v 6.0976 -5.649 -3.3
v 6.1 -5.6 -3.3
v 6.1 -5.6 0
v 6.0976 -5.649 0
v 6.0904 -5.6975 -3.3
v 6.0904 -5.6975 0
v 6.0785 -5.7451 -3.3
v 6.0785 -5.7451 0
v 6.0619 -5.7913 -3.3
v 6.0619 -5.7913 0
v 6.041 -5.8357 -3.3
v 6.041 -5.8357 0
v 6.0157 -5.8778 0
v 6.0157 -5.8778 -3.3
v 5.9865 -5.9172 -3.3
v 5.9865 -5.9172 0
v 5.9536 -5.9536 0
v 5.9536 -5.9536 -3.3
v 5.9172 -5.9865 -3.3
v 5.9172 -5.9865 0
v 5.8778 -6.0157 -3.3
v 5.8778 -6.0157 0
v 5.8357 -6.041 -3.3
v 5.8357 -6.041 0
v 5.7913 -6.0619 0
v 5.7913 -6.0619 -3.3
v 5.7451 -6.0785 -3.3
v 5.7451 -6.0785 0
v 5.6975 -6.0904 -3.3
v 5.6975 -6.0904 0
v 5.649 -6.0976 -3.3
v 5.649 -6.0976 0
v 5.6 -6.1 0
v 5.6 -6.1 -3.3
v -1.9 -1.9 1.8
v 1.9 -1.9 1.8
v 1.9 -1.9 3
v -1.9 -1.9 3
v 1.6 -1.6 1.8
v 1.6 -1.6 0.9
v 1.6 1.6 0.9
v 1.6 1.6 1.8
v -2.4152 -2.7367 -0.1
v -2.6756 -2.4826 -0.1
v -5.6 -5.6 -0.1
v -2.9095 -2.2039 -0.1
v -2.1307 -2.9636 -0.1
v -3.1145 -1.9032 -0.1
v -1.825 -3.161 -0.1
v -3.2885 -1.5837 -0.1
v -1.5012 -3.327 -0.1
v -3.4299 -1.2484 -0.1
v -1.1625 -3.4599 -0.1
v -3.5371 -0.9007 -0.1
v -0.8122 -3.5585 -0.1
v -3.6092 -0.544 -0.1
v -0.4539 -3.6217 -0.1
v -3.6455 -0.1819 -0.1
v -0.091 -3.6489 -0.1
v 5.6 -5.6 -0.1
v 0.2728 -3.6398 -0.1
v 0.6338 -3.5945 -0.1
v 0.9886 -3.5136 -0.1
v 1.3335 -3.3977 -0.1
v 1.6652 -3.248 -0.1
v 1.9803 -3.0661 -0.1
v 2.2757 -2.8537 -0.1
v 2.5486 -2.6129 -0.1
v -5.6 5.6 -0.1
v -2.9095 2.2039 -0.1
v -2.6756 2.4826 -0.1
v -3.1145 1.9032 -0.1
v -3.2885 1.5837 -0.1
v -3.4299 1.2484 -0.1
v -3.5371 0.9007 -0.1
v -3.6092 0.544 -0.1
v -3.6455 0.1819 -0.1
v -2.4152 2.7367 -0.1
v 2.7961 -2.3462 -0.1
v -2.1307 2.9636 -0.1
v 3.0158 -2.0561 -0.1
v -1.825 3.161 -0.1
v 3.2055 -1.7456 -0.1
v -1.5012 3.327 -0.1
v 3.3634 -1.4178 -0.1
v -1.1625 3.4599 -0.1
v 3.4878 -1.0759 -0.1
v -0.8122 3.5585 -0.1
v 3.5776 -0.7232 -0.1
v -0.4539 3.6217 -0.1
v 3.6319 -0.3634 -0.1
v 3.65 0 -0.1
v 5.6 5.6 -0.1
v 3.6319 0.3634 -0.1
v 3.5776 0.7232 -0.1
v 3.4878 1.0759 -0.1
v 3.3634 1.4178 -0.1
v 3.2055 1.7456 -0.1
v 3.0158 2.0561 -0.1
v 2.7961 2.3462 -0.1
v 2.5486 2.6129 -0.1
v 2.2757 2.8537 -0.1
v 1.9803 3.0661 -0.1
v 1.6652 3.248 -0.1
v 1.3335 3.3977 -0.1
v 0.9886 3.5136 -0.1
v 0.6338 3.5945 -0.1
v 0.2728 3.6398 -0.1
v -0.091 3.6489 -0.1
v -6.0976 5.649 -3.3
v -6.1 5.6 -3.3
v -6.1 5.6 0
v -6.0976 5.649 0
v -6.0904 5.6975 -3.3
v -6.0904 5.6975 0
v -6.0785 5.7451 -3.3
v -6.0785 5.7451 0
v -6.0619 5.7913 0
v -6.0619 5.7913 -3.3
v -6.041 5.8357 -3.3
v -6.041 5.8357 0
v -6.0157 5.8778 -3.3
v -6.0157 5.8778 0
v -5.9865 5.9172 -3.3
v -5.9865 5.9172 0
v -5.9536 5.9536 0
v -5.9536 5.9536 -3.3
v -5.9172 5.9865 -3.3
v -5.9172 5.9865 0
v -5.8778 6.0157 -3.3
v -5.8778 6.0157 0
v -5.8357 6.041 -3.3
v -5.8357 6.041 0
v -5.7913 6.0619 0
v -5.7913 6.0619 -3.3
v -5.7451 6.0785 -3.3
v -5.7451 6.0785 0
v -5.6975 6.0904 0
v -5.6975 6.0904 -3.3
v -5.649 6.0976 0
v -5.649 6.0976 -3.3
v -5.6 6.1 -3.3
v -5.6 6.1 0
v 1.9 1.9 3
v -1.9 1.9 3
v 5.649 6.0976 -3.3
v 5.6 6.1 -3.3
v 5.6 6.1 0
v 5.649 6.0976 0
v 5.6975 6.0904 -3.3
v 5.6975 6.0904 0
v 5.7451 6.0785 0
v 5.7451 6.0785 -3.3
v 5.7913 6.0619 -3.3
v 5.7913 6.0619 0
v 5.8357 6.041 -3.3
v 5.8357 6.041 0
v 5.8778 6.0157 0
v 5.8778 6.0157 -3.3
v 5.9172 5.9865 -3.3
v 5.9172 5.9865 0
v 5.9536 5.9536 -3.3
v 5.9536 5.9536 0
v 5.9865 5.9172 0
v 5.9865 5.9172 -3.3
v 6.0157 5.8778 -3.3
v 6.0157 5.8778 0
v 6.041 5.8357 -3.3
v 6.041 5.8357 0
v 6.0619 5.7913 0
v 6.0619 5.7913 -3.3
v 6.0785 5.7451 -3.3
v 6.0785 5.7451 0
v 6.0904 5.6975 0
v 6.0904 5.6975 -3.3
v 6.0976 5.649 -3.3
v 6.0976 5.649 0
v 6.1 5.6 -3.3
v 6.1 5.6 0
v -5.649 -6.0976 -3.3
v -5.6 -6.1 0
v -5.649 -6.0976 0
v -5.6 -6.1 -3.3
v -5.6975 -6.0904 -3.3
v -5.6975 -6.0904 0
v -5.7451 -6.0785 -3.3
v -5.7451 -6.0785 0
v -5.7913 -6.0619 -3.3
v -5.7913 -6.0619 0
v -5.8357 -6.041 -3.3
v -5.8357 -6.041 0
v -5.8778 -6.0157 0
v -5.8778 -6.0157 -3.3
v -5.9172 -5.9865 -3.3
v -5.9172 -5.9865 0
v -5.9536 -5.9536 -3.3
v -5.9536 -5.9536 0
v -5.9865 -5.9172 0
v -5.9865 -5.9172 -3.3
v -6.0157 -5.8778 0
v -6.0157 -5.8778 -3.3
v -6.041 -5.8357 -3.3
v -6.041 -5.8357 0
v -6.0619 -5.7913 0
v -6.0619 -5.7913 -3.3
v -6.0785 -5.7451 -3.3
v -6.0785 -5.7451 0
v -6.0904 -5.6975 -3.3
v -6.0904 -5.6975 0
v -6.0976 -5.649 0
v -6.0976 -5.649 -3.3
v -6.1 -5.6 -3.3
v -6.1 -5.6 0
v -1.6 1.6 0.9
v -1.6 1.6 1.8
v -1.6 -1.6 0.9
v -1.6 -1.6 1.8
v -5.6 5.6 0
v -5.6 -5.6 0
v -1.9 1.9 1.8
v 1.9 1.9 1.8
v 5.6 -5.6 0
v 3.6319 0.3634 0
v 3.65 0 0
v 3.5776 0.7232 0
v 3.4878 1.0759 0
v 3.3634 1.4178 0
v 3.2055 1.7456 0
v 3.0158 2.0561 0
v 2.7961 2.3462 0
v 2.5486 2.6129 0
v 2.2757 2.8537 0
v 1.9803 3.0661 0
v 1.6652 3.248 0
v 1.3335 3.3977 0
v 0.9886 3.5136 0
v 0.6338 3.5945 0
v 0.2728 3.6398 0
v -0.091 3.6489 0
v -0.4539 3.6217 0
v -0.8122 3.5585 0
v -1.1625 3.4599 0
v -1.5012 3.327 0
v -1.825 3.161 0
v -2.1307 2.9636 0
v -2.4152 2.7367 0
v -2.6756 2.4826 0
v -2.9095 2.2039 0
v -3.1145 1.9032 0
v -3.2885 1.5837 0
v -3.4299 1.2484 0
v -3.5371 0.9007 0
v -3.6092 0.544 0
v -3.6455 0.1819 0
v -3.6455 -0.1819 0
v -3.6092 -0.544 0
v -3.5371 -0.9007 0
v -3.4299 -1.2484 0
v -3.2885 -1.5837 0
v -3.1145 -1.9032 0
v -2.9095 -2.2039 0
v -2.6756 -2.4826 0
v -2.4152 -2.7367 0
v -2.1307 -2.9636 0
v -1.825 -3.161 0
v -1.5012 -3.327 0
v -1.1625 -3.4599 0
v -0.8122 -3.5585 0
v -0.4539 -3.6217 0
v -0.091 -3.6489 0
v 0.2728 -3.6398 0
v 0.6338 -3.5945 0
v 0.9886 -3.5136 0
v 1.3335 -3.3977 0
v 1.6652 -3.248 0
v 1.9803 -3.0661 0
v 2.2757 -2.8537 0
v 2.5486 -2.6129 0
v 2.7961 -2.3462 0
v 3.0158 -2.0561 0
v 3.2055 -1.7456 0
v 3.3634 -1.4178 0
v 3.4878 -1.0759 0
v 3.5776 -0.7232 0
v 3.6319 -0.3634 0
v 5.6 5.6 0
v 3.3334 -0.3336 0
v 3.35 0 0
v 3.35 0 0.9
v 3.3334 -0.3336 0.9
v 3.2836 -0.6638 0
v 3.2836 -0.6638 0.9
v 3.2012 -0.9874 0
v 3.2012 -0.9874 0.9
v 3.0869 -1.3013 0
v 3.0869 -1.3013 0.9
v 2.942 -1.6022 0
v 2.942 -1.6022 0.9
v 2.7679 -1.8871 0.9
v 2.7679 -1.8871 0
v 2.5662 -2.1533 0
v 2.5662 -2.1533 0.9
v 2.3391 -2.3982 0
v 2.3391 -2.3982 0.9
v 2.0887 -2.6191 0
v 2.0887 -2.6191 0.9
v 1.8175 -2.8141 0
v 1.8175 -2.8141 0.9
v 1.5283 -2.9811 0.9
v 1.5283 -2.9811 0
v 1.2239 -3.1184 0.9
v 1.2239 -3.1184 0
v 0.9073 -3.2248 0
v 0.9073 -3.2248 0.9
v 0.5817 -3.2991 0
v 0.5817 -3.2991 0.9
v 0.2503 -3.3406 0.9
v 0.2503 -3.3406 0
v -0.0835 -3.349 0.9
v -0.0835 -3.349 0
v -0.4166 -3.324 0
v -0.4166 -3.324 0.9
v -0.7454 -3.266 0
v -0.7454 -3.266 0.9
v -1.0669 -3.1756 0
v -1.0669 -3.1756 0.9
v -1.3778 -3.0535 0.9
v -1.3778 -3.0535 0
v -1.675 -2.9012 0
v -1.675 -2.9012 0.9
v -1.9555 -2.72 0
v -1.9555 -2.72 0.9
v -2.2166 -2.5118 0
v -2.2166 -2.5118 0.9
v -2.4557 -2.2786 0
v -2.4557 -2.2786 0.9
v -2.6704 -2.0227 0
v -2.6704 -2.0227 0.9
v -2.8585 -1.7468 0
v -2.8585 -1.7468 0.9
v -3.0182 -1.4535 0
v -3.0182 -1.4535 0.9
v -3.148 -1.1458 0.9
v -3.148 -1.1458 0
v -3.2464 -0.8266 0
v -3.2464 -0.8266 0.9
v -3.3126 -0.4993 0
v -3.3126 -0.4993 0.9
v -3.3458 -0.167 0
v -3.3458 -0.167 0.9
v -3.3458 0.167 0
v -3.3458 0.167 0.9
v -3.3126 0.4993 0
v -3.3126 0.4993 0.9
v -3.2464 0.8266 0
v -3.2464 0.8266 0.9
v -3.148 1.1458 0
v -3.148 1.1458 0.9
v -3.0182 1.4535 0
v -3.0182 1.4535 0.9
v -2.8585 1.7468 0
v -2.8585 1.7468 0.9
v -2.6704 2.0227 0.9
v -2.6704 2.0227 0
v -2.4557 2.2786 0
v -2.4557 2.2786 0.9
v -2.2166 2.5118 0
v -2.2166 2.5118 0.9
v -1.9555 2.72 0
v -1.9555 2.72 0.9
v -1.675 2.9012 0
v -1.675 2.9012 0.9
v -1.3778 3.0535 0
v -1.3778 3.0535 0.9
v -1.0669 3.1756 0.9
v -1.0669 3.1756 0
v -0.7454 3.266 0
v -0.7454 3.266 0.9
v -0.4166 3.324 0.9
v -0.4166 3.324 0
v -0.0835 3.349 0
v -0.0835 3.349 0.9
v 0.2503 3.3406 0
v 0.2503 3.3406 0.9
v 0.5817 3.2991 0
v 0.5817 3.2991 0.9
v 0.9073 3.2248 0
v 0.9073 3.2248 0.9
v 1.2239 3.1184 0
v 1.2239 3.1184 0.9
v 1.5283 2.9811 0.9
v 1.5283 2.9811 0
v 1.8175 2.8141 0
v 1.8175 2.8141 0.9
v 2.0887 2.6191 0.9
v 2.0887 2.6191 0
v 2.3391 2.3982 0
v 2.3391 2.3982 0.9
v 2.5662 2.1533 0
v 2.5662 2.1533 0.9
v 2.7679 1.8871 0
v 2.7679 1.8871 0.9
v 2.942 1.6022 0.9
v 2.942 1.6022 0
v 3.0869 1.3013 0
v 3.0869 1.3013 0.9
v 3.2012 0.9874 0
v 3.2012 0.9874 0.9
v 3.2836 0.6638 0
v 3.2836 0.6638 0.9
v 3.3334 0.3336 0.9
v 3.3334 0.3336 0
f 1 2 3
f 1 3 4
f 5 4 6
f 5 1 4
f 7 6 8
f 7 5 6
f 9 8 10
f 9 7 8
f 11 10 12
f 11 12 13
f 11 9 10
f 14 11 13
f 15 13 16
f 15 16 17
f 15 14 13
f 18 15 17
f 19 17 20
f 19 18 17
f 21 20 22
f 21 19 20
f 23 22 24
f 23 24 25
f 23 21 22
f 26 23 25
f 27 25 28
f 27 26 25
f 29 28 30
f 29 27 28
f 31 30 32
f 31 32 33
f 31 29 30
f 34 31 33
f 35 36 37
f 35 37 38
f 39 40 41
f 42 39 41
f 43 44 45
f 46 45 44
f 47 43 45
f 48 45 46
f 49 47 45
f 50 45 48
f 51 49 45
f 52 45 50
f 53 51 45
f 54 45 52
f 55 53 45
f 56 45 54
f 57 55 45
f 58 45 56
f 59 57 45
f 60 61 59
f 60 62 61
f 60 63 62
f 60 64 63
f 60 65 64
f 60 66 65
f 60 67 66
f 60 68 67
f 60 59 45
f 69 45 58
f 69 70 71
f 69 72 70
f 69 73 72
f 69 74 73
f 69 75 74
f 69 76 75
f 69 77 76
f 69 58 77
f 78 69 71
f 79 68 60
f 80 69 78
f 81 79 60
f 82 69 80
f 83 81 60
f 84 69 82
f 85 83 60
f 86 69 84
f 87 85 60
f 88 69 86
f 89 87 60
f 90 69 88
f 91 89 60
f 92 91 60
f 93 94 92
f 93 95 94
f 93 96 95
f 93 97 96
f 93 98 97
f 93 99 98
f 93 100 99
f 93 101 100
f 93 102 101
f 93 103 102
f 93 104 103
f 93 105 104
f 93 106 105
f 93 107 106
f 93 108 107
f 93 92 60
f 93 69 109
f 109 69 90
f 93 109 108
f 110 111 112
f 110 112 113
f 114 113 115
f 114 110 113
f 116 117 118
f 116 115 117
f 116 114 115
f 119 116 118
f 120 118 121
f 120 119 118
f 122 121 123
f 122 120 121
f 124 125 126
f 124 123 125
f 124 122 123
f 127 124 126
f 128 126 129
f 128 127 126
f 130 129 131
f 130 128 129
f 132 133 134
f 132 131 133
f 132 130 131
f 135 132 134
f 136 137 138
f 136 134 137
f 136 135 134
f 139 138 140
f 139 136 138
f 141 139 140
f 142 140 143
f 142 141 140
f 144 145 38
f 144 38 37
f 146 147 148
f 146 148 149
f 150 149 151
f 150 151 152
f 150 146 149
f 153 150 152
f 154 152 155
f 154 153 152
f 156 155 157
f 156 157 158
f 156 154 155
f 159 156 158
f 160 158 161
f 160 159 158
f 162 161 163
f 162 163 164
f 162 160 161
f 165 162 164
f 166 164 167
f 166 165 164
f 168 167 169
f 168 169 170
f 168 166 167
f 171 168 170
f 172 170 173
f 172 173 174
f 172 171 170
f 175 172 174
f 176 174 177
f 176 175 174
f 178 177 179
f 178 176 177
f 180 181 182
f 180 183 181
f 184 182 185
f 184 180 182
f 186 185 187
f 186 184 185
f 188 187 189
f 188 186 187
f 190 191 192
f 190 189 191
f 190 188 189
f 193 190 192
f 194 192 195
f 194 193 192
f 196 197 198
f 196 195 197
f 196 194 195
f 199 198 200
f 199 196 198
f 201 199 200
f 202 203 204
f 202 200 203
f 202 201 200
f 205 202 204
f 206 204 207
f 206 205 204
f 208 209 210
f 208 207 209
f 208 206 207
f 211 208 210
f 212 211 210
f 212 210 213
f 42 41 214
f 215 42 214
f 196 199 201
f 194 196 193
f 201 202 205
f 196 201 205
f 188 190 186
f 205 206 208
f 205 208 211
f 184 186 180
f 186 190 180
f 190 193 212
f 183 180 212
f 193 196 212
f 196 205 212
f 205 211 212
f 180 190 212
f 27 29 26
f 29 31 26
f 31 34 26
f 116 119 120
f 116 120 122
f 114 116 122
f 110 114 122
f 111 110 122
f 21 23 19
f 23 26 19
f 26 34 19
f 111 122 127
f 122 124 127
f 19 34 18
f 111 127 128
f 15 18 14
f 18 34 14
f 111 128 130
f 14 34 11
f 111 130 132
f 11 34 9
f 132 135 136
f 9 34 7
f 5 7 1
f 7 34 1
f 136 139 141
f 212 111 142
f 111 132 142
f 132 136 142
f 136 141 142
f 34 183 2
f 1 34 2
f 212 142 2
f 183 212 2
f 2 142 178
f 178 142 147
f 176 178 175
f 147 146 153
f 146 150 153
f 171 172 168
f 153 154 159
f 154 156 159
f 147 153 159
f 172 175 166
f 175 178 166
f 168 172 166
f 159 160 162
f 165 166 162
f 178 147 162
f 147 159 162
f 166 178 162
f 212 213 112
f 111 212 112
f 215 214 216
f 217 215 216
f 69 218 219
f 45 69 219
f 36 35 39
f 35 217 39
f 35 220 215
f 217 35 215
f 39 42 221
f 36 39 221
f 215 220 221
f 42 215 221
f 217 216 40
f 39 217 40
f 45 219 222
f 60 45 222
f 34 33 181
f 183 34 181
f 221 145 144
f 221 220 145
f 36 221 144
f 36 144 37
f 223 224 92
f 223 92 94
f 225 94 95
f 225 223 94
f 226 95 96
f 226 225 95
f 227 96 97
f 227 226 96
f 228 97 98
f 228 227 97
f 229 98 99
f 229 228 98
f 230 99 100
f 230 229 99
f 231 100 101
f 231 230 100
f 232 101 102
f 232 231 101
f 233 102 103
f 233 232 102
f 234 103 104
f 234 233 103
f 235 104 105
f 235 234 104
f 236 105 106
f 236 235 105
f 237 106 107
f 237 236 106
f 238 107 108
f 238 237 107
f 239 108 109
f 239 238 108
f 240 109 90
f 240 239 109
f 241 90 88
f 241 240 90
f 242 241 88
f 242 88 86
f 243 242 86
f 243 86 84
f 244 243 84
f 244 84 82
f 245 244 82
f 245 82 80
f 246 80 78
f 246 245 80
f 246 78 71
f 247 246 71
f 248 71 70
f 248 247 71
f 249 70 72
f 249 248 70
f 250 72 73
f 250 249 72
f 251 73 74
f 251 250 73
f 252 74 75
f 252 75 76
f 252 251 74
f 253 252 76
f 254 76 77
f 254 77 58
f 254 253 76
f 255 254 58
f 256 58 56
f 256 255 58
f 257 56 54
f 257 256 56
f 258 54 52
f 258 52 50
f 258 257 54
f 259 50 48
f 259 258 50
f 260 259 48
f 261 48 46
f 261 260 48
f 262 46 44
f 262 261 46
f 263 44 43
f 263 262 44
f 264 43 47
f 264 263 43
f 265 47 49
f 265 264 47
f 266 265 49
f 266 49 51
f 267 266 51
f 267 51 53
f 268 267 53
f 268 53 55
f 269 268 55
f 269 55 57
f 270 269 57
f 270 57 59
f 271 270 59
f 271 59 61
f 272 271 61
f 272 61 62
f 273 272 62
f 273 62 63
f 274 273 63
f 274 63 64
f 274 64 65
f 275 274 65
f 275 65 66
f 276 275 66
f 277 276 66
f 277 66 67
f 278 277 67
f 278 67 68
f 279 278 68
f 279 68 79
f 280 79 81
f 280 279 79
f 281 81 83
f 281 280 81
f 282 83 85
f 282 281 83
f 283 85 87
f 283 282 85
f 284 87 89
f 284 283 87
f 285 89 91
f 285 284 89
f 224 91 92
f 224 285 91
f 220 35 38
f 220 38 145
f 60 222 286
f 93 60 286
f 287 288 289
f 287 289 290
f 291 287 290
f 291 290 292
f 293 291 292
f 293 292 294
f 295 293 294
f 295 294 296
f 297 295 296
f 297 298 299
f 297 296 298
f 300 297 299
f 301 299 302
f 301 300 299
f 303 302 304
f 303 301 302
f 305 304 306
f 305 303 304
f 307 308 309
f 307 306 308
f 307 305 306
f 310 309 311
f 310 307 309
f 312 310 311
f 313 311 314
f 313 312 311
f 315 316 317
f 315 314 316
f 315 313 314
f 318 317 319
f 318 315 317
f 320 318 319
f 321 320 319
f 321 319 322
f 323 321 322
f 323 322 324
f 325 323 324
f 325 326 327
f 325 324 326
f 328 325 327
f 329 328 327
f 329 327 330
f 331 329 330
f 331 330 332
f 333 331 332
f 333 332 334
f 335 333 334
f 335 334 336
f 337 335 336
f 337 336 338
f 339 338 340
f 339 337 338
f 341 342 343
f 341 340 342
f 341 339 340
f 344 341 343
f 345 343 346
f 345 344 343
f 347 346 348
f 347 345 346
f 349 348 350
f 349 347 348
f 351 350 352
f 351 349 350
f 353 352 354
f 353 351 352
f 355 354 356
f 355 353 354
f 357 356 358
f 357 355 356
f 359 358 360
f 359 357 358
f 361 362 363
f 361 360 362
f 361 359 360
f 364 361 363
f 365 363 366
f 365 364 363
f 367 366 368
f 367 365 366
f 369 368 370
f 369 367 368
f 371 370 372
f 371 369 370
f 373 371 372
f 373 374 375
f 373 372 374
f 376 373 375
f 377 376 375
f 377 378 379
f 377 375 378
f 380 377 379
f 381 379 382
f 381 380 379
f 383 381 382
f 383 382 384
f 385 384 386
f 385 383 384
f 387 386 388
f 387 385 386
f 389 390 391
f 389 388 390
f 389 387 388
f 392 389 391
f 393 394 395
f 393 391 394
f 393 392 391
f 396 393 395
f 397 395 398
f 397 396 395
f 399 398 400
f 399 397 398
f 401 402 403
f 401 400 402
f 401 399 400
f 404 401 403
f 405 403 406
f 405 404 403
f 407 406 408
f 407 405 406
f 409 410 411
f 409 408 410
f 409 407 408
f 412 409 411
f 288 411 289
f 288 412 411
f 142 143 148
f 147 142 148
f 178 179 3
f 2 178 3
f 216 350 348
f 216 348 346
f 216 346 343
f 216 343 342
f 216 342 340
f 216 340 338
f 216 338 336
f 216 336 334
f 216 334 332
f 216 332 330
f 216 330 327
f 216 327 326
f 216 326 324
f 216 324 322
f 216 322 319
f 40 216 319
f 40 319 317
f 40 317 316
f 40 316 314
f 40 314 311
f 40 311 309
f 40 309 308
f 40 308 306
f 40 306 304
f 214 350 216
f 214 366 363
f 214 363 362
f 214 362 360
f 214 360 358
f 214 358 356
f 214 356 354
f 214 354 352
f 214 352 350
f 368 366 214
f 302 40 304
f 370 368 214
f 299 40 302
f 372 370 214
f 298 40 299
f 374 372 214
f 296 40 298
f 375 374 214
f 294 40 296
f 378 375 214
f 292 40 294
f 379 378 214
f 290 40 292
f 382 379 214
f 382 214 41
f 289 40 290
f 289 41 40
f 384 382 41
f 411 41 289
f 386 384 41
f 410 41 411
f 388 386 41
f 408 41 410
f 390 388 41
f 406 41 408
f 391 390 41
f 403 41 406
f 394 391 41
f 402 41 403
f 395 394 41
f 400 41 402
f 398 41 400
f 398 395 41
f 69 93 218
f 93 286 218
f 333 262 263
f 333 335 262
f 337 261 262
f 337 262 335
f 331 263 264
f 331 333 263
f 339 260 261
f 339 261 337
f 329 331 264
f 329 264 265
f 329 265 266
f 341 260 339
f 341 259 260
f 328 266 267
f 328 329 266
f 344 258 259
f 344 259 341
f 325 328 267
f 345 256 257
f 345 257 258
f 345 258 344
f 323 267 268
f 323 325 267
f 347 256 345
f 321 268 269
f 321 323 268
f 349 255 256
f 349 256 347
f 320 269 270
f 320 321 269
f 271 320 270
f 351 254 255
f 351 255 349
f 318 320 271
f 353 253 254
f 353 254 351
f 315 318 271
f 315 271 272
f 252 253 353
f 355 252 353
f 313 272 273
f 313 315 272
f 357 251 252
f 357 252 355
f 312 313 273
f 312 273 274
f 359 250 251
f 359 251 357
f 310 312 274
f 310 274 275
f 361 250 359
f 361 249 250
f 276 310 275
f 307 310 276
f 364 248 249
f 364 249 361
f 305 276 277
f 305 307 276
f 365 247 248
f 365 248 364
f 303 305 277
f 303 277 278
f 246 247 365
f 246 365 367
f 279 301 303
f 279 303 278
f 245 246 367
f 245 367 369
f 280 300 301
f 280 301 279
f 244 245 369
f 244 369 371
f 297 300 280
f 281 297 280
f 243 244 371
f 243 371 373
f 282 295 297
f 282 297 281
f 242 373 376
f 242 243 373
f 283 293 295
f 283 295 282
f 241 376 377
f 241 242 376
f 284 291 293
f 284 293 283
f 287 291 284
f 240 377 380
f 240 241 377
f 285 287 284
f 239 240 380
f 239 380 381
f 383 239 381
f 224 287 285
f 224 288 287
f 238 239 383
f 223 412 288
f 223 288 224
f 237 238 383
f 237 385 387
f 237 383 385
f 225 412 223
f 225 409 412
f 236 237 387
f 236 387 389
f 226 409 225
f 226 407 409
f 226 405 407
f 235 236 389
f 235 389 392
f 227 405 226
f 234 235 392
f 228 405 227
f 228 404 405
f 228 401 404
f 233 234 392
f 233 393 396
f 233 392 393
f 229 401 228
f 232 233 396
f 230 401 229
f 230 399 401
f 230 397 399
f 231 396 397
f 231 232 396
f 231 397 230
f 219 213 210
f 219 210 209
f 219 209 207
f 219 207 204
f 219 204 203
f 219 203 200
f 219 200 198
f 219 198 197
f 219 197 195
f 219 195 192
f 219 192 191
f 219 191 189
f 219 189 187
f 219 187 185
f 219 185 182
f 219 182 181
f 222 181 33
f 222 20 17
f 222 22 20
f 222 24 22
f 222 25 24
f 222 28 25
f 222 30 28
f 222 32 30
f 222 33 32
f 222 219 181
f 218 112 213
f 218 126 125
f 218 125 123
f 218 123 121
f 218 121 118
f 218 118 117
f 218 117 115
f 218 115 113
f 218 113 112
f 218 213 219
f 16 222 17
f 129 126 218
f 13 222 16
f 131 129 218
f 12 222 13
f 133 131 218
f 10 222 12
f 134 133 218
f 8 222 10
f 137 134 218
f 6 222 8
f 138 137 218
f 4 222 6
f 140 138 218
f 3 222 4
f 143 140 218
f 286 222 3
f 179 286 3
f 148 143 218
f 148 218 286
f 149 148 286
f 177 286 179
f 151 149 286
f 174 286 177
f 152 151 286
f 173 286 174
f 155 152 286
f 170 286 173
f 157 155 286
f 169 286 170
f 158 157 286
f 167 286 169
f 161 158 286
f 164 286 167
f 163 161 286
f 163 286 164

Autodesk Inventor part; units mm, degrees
ref_plane "YZ Plane" through (0, 0, 0) normal (1, 0, 0) x (0, 1, 0)
ref_plane "XZ Plane" through (0, 0, 0) normal (0, 1, 0) x (-1, 0, 0)
ref_plane "XY Plane" through (0, 0, 0) normal (0, 0, 1) x (1, 0, 0)
sketch "스케치1" plane through (0, 0, 0) normal (0, 0, 1) x (1, 0, 0)
  line L0 (-6.1, 6.1) -> (6.1, 6.1)
  line L1 (6.1, 6.1) -> (6.1, -6.1)
  line L2 (6.1, -6.1) -> (-6.1, -6.1)
  line L3 (-6.1, -6.1) -> (-6.1, 6.1)
  line L4 (-6.1, 6.1) -> (6.1, -6.1) construction
  line L5 (6.1, 6.1) -> (-6.1, -6.1) construction
  circle A0 centre (0, 0) radius 3.35
  line L6 (-1.6, 1.6) -> (1.6, 1.6)
  line L7 (1.6, 1.6) -> (1.6, -1.6)
  line L8 (1.6, -1.6) -> (-1.6, -1.6)
  line L9 (-1.6, -1.6) -> (-1.6, 1.6)
  line L10 (-1.6, 1.6) -> (1.6, -1.6) construction
  line L11 (1.6, 1.6) -> (-1.6, -1.6) construction
  line L12 (-1.9, 1.9) -> (1.9, 1.9)
  line L13 (1.9, 1.9) -> (1.9, -1.9)
  line L14 (1.9, -1.9) -> (-1.9, -1.9)
  line L15 (-1.9, -1.9) -> (-1.9, 1.9)
  line L16 (-1.9, 1.9) -> (1.9, -1.9) construction
  line L17 (1.9, 1.9) -> (-1.9, -1.9) construction
  point P0 (0, 0)
  dimension "d0" = 12.2
  dimension "d1" = 12.2
  dimension "d2" = 6.7
  dimension "d3" = 3.2
  dimension "d4" = 3.2
  dimension "d5" = 3.8
  dimension "d6" = 3.8
extrude "돌출1" add sketch "스케치1" against normal blind 3.3 contours L0 L1 L2 L3 | A0 | L6 L7 L8 L9 | L12 L13 L14 L15
extrude "돌출2" add sketch "스케치1" along normal blind 0.9 contours A0 | L6 L7 L8 L9 | L12 L13 L14 L15
extrude "돌출3" add sketch "스케치1" along normal blind 3 contours L6 L7 L8 L9 | L12 L13 L14 L15
sketch "스케치2" plane through (0, 0, 0.9) normal (0, 0, 1) x (1, 0, 0)
  line L0 (-1.6, -1.6) -> (1.6, -1.6)
  line L1 (1.6, -1.6) -> (1.6, 1.6)
  line L2 (1.6, 1.6) -> (-1.6, 1.6)
  line L3 (-1.6, 1.6) -> (-1.6, -1.6)
  line L4 (-1.6, -1.6) -> (1.6, 1.6) construction
  line L5 (1.6, -1.6) -> (-1.6, 1.6) construction
  line L6 (-1.9, -1.9) -> (1.9, -1.9) projected
  line L7 (1.9, -1.9) -> (1.9, 1.9) projected
  line L8 (1.9, 1.9) -> (-1.9, 1.9) projected
  line L9 (-1.9, 1.9) -> (-1.9, -1.9) projected
  point P0 (0, 0)
  dimension "d13" = 3.2
  dimension "d14" = 3.2
extrude "돌출4" cut sketch "스케치2" along normal blind 0.9
fillet "모깎기1" radius 0.5 4 edges at (6.1, 6.1, -1.65) (6.1, -6.1, -1.65) (-6.1, -6.1, -1.65) (-6.1, 6.1, -1.65)
sketch "스케치3" plane through (0, 0, 0) normal (0, 0, 1) x (1, 0, 0)
  circle A0 centre (0, 0) radius 3.35 projected
  arc A1 (-5.6, 6.1) -> (-6.1, 5.6) centre (-5.6, 5.6) ccw projected
  line L0 (-6.1, 5.6) -> (-6.1, -5.6) projected
  arc A2 (-6.1, -5.6) -> (-5.6, -6.1) centre (-5.6, -5.6) ccw projected
  line L1 (-5.6, -6.1) -> (5.6, -6.1) projected
  arc A3 (5.6, -6.1) -> (6.1, -5.6) centre (5.6, -5.6) ccw projected
  line L2 (6.1, -5.6) -> (6.1, 5.6) projected
  arc A4 (6.1, 5.6) -> (5.6, 6.1) centre (5.6, 5.6) ccw projected
  line L3 (5.6, 6.1) -> (-5.6, 6.1) projected
  line L4 (-5.6, 5.6) -> (-5.6, -5.6)
  line L5 (-5.6, -5.6) -> (5.6, -5.6)
  line L6 (5.6, -5.6) -> (5.6, 5.6)
  line L7 (5.6, 5.6) -> (-5.6, 5.6)
  circle A5 centre (0, 0) radius 3.65
  point P0 (0, 0)
  dimension "d18" = 0.5
  dimension "d19" = 0.3
extrude "돌출5" cut sketch "스케치3" against normal blind 0.1 contours L7 L6 L5 L4
properties part number "텍트 스위치"
